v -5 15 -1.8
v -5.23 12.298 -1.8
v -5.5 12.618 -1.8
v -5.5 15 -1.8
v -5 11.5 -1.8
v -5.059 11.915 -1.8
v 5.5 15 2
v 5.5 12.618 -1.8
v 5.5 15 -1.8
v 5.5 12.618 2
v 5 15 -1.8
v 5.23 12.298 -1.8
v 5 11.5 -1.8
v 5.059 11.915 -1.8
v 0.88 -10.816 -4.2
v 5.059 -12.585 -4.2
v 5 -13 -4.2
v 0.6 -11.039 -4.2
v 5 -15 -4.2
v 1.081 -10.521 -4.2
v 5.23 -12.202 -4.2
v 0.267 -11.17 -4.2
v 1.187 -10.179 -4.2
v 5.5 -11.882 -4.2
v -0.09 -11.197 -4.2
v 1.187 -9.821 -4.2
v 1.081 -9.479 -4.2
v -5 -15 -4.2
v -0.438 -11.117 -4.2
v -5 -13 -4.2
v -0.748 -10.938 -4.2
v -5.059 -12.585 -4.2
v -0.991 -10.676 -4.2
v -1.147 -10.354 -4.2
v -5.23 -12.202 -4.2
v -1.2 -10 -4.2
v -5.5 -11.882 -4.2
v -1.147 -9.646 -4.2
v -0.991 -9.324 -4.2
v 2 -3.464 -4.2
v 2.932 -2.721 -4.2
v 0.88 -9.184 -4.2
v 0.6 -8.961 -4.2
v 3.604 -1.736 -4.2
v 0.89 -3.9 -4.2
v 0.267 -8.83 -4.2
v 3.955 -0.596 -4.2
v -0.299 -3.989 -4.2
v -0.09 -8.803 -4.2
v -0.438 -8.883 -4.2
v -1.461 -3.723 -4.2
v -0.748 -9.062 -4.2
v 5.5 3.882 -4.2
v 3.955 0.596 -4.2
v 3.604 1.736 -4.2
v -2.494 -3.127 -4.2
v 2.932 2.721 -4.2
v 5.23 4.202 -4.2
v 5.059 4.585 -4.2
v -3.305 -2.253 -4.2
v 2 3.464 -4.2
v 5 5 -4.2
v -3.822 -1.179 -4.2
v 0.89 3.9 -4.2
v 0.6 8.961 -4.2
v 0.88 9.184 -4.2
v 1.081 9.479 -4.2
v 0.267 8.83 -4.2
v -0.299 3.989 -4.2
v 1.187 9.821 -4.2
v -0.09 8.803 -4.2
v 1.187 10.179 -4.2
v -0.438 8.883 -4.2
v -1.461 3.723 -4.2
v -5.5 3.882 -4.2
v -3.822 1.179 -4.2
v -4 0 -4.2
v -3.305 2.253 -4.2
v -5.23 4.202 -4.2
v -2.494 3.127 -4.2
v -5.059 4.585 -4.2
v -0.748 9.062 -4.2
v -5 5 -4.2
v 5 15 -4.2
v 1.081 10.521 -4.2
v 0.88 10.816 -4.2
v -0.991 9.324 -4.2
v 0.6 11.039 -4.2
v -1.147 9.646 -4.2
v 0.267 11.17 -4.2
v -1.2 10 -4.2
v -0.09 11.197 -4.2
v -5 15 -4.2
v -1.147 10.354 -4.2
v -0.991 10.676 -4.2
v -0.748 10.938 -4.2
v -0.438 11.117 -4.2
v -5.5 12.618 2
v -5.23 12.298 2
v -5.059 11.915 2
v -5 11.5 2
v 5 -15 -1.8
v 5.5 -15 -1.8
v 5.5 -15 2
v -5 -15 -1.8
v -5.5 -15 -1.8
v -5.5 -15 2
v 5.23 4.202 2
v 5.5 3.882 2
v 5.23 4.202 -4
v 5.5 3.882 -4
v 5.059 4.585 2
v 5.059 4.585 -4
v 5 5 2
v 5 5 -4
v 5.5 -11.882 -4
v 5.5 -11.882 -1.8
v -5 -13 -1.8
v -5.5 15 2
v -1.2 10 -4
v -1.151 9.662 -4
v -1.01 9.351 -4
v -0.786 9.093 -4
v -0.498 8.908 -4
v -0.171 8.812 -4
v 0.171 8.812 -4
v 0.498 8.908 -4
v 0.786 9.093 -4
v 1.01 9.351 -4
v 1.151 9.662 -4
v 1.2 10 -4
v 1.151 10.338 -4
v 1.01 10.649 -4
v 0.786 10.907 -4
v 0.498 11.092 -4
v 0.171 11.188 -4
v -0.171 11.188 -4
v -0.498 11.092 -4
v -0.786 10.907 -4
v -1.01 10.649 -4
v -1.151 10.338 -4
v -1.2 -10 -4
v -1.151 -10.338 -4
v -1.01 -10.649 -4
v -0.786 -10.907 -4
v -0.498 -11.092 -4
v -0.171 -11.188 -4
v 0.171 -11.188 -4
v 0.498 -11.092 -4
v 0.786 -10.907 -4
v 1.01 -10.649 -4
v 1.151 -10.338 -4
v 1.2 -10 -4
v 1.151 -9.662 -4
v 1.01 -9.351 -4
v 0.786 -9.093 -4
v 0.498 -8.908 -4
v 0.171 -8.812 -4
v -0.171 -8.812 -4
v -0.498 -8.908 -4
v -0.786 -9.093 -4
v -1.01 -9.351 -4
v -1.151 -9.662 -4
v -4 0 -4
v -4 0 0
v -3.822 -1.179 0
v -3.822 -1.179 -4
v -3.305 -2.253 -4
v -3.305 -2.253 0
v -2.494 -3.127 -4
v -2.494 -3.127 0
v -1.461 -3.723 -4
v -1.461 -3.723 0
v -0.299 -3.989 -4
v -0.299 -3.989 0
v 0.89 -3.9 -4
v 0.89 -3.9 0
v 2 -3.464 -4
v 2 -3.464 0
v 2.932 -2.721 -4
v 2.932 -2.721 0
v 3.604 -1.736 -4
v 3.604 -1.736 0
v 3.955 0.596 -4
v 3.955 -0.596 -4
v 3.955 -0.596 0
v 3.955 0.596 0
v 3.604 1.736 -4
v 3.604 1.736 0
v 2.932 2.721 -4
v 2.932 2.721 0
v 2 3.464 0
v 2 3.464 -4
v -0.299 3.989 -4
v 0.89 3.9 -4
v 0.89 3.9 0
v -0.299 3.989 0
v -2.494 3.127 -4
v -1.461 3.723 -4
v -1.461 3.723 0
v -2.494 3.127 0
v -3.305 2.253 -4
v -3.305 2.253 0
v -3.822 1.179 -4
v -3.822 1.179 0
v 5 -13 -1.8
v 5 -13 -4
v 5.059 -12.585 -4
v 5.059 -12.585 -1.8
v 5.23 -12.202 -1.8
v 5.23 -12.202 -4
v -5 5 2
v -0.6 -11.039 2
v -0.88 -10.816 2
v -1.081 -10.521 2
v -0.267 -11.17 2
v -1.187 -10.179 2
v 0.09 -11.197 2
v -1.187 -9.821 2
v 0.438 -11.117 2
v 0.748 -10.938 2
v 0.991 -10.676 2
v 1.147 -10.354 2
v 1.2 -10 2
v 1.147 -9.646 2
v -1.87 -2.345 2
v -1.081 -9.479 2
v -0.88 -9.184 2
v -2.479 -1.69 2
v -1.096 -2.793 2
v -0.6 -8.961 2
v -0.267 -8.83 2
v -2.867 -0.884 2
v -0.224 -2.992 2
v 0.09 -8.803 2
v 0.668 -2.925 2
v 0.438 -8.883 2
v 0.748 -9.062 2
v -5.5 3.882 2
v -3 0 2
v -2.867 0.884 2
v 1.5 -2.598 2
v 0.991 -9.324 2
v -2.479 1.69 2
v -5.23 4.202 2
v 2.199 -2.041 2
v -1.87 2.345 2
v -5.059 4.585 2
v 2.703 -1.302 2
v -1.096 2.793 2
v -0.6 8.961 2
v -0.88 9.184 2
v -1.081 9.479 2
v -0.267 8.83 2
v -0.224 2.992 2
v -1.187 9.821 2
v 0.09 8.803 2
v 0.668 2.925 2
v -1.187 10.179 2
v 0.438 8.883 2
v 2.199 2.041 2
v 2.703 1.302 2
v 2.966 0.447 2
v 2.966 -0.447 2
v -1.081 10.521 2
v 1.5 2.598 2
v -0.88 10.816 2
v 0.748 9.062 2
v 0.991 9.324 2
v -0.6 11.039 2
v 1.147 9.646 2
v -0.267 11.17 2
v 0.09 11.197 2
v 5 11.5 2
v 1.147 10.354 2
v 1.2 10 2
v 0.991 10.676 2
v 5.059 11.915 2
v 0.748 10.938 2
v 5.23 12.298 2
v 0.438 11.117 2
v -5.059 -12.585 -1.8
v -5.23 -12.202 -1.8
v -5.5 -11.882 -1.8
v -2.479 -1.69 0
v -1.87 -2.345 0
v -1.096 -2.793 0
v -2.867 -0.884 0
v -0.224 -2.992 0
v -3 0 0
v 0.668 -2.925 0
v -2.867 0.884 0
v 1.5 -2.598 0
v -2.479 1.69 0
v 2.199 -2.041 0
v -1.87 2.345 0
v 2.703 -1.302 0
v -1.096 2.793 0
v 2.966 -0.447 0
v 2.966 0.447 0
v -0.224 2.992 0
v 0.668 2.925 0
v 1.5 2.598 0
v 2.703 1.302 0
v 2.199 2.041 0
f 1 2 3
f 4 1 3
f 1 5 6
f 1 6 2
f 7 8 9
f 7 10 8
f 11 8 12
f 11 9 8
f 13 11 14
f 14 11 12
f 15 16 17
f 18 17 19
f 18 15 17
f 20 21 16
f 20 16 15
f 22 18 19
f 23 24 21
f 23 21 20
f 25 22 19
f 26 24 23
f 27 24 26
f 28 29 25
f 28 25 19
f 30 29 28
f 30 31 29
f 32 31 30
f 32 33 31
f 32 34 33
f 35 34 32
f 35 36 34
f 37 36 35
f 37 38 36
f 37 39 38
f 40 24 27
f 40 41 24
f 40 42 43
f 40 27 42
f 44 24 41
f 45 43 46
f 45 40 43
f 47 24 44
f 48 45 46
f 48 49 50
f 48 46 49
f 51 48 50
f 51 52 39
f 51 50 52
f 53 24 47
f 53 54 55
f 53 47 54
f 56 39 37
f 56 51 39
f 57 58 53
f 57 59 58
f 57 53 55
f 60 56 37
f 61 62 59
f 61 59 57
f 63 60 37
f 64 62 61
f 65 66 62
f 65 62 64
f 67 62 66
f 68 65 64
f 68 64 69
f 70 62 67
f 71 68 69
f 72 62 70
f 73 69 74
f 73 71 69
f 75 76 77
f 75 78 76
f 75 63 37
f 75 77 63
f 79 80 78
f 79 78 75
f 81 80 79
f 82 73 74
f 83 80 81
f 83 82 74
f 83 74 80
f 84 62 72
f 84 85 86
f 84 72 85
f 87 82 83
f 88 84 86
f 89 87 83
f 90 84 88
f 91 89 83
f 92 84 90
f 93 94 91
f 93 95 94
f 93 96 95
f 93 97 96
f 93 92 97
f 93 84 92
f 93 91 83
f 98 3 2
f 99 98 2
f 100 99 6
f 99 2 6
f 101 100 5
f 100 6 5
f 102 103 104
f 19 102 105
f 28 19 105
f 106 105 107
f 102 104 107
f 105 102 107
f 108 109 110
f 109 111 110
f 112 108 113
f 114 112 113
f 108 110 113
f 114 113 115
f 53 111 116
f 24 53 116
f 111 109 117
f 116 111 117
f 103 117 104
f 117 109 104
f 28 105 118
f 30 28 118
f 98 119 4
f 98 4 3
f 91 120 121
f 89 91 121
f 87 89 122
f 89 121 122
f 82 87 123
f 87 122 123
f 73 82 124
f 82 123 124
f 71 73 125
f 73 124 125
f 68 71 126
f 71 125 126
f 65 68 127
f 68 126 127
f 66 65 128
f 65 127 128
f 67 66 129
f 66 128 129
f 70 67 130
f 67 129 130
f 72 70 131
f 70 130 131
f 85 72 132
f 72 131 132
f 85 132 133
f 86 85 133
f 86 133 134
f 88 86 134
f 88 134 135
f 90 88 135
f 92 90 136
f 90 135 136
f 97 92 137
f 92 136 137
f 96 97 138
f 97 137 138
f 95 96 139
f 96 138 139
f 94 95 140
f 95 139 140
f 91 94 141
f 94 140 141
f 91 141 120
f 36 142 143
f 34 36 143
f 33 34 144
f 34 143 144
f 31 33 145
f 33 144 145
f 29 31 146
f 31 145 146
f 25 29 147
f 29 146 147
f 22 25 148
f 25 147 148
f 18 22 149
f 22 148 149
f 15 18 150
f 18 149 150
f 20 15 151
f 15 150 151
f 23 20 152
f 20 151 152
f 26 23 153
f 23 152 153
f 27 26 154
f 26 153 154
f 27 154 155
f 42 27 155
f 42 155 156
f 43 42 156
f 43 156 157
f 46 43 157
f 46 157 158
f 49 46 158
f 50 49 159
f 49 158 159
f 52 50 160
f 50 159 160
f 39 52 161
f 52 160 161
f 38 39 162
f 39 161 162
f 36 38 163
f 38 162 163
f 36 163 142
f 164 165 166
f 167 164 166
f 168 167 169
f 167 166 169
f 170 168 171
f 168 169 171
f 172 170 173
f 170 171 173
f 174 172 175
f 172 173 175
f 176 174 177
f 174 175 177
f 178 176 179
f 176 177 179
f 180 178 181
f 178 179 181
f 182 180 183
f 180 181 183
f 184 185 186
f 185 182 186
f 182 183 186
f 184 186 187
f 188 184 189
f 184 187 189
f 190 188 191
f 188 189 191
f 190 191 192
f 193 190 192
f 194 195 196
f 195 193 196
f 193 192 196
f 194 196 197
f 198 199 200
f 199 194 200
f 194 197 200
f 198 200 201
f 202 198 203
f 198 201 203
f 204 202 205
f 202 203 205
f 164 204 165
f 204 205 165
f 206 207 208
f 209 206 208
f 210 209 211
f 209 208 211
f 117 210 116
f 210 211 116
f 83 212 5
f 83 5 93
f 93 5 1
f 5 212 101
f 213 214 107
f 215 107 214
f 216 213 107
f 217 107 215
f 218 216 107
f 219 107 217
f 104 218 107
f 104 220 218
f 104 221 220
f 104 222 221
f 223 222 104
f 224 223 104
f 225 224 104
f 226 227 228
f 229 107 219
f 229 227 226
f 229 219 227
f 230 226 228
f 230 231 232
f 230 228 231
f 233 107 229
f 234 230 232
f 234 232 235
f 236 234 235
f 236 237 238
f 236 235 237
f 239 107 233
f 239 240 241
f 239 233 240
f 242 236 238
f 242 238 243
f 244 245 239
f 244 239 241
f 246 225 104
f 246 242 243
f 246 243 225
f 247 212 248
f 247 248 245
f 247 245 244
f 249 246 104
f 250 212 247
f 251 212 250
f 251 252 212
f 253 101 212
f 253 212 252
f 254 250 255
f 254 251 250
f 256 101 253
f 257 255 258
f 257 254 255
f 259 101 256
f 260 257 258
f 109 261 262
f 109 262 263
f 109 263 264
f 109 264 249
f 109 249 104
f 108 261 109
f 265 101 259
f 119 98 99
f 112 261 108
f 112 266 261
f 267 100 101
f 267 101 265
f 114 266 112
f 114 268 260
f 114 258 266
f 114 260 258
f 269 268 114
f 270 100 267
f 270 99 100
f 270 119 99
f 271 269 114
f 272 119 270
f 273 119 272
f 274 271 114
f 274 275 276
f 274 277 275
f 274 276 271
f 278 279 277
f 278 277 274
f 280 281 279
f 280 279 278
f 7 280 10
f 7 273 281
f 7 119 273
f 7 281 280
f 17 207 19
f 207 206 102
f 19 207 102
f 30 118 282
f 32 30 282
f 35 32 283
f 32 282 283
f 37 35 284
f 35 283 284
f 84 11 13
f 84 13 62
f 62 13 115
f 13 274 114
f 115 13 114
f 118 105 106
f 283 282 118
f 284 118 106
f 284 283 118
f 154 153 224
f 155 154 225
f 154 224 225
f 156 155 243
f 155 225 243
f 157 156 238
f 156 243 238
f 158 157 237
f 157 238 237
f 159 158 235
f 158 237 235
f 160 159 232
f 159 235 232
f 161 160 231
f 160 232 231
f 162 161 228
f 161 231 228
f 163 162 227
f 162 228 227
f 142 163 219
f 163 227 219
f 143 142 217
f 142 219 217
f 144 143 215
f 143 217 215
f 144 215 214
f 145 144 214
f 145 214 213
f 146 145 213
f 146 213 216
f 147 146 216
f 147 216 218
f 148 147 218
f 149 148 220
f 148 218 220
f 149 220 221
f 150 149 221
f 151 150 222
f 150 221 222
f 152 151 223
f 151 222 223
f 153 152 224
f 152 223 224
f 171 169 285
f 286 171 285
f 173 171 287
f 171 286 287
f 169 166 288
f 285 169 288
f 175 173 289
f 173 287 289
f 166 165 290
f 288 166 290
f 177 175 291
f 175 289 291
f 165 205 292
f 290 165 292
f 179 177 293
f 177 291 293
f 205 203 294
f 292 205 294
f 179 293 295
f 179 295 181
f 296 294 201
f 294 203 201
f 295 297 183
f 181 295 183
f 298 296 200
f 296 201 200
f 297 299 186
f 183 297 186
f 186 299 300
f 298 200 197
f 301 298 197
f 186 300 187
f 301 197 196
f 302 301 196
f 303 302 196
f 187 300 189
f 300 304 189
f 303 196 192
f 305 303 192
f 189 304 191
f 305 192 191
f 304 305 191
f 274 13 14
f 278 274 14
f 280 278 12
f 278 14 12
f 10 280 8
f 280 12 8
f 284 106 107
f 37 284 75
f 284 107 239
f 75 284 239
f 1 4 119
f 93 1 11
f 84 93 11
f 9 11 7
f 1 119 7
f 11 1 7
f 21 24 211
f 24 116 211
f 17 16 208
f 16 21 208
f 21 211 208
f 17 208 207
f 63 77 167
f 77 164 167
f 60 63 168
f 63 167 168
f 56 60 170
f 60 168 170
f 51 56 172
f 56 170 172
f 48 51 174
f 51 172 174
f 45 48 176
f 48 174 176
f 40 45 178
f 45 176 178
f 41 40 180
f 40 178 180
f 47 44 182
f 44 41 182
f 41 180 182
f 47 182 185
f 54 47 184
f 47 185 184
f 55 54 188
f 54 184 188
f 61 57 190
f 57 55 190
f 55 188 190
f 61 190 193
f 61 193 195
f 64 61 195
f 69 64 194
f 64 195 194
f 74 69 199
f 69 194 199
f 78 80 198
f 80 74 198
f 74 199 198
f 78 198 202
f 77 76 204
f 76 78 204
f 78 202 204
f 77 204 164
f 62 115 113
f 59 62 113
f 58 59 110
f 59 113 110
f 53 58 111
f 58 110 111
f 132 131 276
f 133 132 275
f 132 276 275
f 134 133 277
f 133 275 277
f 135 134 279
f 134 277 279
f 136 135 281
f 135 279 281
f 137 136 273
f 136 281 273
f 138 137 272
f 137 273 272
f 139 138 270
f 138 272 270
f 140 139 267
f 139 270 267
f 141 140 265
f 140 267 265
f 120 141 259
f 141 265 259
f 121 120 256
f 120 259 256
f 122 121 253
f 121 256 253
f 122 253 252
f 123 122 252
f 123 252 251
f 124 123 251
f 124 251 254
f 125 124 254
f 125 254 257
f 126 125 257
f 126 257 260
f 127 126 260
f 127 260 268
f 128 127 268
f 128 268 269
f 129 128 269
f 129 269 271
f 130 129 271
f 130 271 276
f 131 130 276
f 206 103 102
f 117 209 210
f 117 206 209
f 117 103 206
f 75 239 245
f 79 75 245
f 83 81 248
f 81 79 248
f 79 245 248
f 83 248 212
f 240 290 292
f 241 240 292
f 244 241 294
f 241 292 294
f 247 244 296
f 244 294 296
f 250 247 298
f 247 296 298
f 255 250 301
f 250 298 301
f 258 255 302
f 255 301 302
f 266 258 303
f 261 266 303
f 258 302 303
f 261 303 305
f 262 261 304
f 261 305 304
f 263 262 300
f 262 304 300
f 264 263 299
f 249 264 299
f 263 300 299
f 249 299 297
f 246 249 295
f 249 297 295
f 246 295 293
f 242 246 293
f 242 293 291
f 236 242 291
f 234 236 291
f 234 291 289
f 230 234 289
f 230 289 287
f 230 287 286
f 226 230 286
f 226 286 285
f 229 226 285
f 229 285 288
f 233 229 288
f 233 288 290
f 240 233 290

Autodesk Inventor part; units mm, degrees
ref_plane "YZ Plane" through (0, 0, 0) normal (1, 0, 0) x (0, 1, 0)
ref_plane "XZ Plane" through (0, 0, 0) normal (0, 1, 0) x (-1, 0, 0)
ref_plane "XY Plane" through (0, 0, 0) normal (0, 0, 1) x (1, 0, 0)
sketch "Sketch1" plane through (0, 0, 0) normal (0, 0, 1) x (1, 0, 0)
  line L0 (-5.5, -15) -> (5.5, -15)
  line L1 (5.5, -15) -> (5.5, 15)
  line L2 (5.5, 15) -> (-5.5, 15)
  line L3 (-5.5, 15) -> (-5.5, -15)
  line L4 (-5.5, -15) -> (5.5, 15) construction
  line L5 (5.5, -15) -> (-5.5, 15) construction
  circle A0 centre (0, 0) radius 3 projected
  circle A1 centre (0, 0) radius 3.7 projected
  dimension "d0" = 5.5
  dimension "d1" = 15
extrude "Extrusion1" add sketch "Sketch1" along normal blind 2 contours L3 L2 L1 L0 | A0 | A1
sketch "Sketch2" plane through (0, 0, 0) normal (0, 0, -1) x (-1, 0, 0)
  line L0 (5.5, -15) -> (-5.5, -15) projected
  line L1 (5.5, 15) -> (5.5, -15) projected
  line L2 (-5.5, 15) -> (5.5, 15) projected
  line L3 (-5.5, -15) -> (-5.5, 15) projected
  circle A0 centre (0, 0) radius 4 projected
extrude "Extrusion2" add sketch "Sketch2" along normal blind 4
sketch "Sketch3" plane through (0, 0, 2) normal (0, 0, 1) x (1, 0, 0)
  line L0 (-5.5, -15) -> (5.5, -15) projected
  line L1 (5.5, 15) -> (-5.5, 15) projected
  circle A0 centre (0, 10) radius 1.2
  circle A1 centre (0, -10) radius 1.2
  dimension "d6" = 2.4
  dimension "d7" = 2.4
  dimension "d8" = 5
  dimension "d9" = 5
extrude "Extrusion3" cut sketch "Sketch3" against normal blind 10
sketch "Sketch6" plane through (0, 0, -4) normal (0, 0, -1) x (-1, 0, 0)
  line L0 (-5.5, -15) -> (5.5, -15) projected
  line L1 (5.5, -15) -> (5.5, 15) projected
  line L2 (-5.5, 15) -> (-5.5, -15) projected
  line L3 (5.5, 12) -> (5.5, 13.2929) projected
  line L4 (5.5, -15) -> (5.5, -13.7071) projected
  line L5 (5.5, 12) -> (-5.5, 12)
  arc A0 (5, 5) -> (5.5, 3.882) centre (6.5, 5) ccw
  line L6 (5, 11.5) -> (5, 5)
  arc A1 (5.5, -12.3842) -> (5, -13.7071) centre (7, -13.7071) ccw
  line L7 (5, -13.7071) -> (5, -15)
  arc A2 (5.5, 12.618) -> (5, 11.5) centre (6.5, 11.5) ccw
  line L8 (5.5, 15) -> (-5.5, 15) projected
  dimension "d23" = 3
  dimension "d25" = 4
  dimension "d38" = 10
  dimension "d39" = 3.5
  dimension "d40" = 0.5
  dimension "d41" = 1.5
sketch "Sketch7" plane through (0, 0, -4) normal (0, 0, -1) x (-1, 0, 0)
  arc A0 (5.5, 12.8229) -> (5, 11.5) centre (7, 11.5) ccw projected
  line L0 (5.5, 15) -> (-5.5, 15) projected
  line L1 (-5.5, -15) -> (5.5, -15) projected
  line L2 (5.5, -15) -> (5.5, 15) projected
  line L3 (5, 5) -> (5, 11.5) projected
  line L4 (5, 11.5) -> (5, 15)
  arc A1 (5.5, -11.882) -> (5, -13) centre (6.5, -13) ccw
  line L5 (5, -13) -> (5, -15)
  line L6 (5, -15) -> (5.5, -15)
  line L7 (5.5, -15) -> (5.5, -11.882)
  line L8 (5.5, -15) -> (5.5, 15) projected
  line L9 (5, 15) -> (5.5, 15)
  line L10 (5.5, 15) -> (5.5, 12.8229)
  line L11 (5.5, 12.8229) -> (5.5, 11.5)
  line L12 (5.5, 11.5) -> (5.5, 10.597)
  line L13 (5.5, 10.597) -> (5, 10.597)
  line L14 (5, 10.597) -> (5, 11.5)
  point P0 (5.5, 3.6771)
  dimension "d29" = 3
  dimension "d30" = 2
  dimension "d51" = 0.5
extrude "Extrusion8" cut sketch "Sketch6" against normal blind 100 contours A2 L1 L5 | L5 L1 A0 L6 A2
extrude "Extrusion9" cut sketch "Sketch7" against normal blind 2.2
ref_plane "Work Plane1" through (0, -15, 2) normal (-1, 0, 0) x (0, 0, 1)
mirror "Mirror1" about plane through (0, -15, 2) normal (-1, 0, 0) of "Extrusion9", "Extrusion8"
sketch "Sketch8" plane through (0, 0, -4) normal (0, 0, -1) x (-1, 0, 0)
  circle A0 centre (0, 10) radius 1.2 projected
  circle A1 centre (0, -10) radius 1.2 projected
  circle A2 centre (0, 0) radius 4 projected
  line L0 (-5, 15) -> (-5, 5) projected
  arc A3 (-5.5, 3.882) -> (-5, 5) centre (-6.5, 5) ccw projected
  line L1 (-5.5, 3.882) -> (-5.5, -11.882) projected
  arc A4 (-5, -13) -> (-5.5, -11.882) centre (-6.5, -13) ccw projected
  line L2 (-5, -13) -> (-5, -15) projected
  line L3 (-5, -15) -> (5, -15) projected
  line L4 (5, -15) -> (5, -13) projected
  arc A5 (5.5, -11.882) -> (5, -13) centre (6.5, -13) ccw projected
  line L5 (5.5, -11.882) -> (5.5, 3.882) projected
  arc A6 (5, 5) -> (5.5, 3.882) centre (6.5, 5) ccw projected
  line L6 (5, 5) -> (5, 15) projected
  line L7 (5, 15) -> (-5, 15) projected
extrude "Extrusion10" add sketch "Sketch8" along normal blind 0.2
sketch "Sketch9" plane through (0, 0, 0) normal (0, 0, -1) x (-1, 0, 0)
  circle A0 centre (0, 0) radius 4 projected
  circle A1 centre (0, 0) radius 3
  dimension "d44" = 6
extrude "Extrusion11" cut sketch "Sketch9" against normal blind 100 contours A1
thread "Thread1" size "M3x0.5" class "6H" standard "ANSI Metric M Profile" full length
thread "Thread2" size "M3x0.5" class "6H" standard "ANSI Metric M Profile" full length
properties material "PAEK Plastic"
